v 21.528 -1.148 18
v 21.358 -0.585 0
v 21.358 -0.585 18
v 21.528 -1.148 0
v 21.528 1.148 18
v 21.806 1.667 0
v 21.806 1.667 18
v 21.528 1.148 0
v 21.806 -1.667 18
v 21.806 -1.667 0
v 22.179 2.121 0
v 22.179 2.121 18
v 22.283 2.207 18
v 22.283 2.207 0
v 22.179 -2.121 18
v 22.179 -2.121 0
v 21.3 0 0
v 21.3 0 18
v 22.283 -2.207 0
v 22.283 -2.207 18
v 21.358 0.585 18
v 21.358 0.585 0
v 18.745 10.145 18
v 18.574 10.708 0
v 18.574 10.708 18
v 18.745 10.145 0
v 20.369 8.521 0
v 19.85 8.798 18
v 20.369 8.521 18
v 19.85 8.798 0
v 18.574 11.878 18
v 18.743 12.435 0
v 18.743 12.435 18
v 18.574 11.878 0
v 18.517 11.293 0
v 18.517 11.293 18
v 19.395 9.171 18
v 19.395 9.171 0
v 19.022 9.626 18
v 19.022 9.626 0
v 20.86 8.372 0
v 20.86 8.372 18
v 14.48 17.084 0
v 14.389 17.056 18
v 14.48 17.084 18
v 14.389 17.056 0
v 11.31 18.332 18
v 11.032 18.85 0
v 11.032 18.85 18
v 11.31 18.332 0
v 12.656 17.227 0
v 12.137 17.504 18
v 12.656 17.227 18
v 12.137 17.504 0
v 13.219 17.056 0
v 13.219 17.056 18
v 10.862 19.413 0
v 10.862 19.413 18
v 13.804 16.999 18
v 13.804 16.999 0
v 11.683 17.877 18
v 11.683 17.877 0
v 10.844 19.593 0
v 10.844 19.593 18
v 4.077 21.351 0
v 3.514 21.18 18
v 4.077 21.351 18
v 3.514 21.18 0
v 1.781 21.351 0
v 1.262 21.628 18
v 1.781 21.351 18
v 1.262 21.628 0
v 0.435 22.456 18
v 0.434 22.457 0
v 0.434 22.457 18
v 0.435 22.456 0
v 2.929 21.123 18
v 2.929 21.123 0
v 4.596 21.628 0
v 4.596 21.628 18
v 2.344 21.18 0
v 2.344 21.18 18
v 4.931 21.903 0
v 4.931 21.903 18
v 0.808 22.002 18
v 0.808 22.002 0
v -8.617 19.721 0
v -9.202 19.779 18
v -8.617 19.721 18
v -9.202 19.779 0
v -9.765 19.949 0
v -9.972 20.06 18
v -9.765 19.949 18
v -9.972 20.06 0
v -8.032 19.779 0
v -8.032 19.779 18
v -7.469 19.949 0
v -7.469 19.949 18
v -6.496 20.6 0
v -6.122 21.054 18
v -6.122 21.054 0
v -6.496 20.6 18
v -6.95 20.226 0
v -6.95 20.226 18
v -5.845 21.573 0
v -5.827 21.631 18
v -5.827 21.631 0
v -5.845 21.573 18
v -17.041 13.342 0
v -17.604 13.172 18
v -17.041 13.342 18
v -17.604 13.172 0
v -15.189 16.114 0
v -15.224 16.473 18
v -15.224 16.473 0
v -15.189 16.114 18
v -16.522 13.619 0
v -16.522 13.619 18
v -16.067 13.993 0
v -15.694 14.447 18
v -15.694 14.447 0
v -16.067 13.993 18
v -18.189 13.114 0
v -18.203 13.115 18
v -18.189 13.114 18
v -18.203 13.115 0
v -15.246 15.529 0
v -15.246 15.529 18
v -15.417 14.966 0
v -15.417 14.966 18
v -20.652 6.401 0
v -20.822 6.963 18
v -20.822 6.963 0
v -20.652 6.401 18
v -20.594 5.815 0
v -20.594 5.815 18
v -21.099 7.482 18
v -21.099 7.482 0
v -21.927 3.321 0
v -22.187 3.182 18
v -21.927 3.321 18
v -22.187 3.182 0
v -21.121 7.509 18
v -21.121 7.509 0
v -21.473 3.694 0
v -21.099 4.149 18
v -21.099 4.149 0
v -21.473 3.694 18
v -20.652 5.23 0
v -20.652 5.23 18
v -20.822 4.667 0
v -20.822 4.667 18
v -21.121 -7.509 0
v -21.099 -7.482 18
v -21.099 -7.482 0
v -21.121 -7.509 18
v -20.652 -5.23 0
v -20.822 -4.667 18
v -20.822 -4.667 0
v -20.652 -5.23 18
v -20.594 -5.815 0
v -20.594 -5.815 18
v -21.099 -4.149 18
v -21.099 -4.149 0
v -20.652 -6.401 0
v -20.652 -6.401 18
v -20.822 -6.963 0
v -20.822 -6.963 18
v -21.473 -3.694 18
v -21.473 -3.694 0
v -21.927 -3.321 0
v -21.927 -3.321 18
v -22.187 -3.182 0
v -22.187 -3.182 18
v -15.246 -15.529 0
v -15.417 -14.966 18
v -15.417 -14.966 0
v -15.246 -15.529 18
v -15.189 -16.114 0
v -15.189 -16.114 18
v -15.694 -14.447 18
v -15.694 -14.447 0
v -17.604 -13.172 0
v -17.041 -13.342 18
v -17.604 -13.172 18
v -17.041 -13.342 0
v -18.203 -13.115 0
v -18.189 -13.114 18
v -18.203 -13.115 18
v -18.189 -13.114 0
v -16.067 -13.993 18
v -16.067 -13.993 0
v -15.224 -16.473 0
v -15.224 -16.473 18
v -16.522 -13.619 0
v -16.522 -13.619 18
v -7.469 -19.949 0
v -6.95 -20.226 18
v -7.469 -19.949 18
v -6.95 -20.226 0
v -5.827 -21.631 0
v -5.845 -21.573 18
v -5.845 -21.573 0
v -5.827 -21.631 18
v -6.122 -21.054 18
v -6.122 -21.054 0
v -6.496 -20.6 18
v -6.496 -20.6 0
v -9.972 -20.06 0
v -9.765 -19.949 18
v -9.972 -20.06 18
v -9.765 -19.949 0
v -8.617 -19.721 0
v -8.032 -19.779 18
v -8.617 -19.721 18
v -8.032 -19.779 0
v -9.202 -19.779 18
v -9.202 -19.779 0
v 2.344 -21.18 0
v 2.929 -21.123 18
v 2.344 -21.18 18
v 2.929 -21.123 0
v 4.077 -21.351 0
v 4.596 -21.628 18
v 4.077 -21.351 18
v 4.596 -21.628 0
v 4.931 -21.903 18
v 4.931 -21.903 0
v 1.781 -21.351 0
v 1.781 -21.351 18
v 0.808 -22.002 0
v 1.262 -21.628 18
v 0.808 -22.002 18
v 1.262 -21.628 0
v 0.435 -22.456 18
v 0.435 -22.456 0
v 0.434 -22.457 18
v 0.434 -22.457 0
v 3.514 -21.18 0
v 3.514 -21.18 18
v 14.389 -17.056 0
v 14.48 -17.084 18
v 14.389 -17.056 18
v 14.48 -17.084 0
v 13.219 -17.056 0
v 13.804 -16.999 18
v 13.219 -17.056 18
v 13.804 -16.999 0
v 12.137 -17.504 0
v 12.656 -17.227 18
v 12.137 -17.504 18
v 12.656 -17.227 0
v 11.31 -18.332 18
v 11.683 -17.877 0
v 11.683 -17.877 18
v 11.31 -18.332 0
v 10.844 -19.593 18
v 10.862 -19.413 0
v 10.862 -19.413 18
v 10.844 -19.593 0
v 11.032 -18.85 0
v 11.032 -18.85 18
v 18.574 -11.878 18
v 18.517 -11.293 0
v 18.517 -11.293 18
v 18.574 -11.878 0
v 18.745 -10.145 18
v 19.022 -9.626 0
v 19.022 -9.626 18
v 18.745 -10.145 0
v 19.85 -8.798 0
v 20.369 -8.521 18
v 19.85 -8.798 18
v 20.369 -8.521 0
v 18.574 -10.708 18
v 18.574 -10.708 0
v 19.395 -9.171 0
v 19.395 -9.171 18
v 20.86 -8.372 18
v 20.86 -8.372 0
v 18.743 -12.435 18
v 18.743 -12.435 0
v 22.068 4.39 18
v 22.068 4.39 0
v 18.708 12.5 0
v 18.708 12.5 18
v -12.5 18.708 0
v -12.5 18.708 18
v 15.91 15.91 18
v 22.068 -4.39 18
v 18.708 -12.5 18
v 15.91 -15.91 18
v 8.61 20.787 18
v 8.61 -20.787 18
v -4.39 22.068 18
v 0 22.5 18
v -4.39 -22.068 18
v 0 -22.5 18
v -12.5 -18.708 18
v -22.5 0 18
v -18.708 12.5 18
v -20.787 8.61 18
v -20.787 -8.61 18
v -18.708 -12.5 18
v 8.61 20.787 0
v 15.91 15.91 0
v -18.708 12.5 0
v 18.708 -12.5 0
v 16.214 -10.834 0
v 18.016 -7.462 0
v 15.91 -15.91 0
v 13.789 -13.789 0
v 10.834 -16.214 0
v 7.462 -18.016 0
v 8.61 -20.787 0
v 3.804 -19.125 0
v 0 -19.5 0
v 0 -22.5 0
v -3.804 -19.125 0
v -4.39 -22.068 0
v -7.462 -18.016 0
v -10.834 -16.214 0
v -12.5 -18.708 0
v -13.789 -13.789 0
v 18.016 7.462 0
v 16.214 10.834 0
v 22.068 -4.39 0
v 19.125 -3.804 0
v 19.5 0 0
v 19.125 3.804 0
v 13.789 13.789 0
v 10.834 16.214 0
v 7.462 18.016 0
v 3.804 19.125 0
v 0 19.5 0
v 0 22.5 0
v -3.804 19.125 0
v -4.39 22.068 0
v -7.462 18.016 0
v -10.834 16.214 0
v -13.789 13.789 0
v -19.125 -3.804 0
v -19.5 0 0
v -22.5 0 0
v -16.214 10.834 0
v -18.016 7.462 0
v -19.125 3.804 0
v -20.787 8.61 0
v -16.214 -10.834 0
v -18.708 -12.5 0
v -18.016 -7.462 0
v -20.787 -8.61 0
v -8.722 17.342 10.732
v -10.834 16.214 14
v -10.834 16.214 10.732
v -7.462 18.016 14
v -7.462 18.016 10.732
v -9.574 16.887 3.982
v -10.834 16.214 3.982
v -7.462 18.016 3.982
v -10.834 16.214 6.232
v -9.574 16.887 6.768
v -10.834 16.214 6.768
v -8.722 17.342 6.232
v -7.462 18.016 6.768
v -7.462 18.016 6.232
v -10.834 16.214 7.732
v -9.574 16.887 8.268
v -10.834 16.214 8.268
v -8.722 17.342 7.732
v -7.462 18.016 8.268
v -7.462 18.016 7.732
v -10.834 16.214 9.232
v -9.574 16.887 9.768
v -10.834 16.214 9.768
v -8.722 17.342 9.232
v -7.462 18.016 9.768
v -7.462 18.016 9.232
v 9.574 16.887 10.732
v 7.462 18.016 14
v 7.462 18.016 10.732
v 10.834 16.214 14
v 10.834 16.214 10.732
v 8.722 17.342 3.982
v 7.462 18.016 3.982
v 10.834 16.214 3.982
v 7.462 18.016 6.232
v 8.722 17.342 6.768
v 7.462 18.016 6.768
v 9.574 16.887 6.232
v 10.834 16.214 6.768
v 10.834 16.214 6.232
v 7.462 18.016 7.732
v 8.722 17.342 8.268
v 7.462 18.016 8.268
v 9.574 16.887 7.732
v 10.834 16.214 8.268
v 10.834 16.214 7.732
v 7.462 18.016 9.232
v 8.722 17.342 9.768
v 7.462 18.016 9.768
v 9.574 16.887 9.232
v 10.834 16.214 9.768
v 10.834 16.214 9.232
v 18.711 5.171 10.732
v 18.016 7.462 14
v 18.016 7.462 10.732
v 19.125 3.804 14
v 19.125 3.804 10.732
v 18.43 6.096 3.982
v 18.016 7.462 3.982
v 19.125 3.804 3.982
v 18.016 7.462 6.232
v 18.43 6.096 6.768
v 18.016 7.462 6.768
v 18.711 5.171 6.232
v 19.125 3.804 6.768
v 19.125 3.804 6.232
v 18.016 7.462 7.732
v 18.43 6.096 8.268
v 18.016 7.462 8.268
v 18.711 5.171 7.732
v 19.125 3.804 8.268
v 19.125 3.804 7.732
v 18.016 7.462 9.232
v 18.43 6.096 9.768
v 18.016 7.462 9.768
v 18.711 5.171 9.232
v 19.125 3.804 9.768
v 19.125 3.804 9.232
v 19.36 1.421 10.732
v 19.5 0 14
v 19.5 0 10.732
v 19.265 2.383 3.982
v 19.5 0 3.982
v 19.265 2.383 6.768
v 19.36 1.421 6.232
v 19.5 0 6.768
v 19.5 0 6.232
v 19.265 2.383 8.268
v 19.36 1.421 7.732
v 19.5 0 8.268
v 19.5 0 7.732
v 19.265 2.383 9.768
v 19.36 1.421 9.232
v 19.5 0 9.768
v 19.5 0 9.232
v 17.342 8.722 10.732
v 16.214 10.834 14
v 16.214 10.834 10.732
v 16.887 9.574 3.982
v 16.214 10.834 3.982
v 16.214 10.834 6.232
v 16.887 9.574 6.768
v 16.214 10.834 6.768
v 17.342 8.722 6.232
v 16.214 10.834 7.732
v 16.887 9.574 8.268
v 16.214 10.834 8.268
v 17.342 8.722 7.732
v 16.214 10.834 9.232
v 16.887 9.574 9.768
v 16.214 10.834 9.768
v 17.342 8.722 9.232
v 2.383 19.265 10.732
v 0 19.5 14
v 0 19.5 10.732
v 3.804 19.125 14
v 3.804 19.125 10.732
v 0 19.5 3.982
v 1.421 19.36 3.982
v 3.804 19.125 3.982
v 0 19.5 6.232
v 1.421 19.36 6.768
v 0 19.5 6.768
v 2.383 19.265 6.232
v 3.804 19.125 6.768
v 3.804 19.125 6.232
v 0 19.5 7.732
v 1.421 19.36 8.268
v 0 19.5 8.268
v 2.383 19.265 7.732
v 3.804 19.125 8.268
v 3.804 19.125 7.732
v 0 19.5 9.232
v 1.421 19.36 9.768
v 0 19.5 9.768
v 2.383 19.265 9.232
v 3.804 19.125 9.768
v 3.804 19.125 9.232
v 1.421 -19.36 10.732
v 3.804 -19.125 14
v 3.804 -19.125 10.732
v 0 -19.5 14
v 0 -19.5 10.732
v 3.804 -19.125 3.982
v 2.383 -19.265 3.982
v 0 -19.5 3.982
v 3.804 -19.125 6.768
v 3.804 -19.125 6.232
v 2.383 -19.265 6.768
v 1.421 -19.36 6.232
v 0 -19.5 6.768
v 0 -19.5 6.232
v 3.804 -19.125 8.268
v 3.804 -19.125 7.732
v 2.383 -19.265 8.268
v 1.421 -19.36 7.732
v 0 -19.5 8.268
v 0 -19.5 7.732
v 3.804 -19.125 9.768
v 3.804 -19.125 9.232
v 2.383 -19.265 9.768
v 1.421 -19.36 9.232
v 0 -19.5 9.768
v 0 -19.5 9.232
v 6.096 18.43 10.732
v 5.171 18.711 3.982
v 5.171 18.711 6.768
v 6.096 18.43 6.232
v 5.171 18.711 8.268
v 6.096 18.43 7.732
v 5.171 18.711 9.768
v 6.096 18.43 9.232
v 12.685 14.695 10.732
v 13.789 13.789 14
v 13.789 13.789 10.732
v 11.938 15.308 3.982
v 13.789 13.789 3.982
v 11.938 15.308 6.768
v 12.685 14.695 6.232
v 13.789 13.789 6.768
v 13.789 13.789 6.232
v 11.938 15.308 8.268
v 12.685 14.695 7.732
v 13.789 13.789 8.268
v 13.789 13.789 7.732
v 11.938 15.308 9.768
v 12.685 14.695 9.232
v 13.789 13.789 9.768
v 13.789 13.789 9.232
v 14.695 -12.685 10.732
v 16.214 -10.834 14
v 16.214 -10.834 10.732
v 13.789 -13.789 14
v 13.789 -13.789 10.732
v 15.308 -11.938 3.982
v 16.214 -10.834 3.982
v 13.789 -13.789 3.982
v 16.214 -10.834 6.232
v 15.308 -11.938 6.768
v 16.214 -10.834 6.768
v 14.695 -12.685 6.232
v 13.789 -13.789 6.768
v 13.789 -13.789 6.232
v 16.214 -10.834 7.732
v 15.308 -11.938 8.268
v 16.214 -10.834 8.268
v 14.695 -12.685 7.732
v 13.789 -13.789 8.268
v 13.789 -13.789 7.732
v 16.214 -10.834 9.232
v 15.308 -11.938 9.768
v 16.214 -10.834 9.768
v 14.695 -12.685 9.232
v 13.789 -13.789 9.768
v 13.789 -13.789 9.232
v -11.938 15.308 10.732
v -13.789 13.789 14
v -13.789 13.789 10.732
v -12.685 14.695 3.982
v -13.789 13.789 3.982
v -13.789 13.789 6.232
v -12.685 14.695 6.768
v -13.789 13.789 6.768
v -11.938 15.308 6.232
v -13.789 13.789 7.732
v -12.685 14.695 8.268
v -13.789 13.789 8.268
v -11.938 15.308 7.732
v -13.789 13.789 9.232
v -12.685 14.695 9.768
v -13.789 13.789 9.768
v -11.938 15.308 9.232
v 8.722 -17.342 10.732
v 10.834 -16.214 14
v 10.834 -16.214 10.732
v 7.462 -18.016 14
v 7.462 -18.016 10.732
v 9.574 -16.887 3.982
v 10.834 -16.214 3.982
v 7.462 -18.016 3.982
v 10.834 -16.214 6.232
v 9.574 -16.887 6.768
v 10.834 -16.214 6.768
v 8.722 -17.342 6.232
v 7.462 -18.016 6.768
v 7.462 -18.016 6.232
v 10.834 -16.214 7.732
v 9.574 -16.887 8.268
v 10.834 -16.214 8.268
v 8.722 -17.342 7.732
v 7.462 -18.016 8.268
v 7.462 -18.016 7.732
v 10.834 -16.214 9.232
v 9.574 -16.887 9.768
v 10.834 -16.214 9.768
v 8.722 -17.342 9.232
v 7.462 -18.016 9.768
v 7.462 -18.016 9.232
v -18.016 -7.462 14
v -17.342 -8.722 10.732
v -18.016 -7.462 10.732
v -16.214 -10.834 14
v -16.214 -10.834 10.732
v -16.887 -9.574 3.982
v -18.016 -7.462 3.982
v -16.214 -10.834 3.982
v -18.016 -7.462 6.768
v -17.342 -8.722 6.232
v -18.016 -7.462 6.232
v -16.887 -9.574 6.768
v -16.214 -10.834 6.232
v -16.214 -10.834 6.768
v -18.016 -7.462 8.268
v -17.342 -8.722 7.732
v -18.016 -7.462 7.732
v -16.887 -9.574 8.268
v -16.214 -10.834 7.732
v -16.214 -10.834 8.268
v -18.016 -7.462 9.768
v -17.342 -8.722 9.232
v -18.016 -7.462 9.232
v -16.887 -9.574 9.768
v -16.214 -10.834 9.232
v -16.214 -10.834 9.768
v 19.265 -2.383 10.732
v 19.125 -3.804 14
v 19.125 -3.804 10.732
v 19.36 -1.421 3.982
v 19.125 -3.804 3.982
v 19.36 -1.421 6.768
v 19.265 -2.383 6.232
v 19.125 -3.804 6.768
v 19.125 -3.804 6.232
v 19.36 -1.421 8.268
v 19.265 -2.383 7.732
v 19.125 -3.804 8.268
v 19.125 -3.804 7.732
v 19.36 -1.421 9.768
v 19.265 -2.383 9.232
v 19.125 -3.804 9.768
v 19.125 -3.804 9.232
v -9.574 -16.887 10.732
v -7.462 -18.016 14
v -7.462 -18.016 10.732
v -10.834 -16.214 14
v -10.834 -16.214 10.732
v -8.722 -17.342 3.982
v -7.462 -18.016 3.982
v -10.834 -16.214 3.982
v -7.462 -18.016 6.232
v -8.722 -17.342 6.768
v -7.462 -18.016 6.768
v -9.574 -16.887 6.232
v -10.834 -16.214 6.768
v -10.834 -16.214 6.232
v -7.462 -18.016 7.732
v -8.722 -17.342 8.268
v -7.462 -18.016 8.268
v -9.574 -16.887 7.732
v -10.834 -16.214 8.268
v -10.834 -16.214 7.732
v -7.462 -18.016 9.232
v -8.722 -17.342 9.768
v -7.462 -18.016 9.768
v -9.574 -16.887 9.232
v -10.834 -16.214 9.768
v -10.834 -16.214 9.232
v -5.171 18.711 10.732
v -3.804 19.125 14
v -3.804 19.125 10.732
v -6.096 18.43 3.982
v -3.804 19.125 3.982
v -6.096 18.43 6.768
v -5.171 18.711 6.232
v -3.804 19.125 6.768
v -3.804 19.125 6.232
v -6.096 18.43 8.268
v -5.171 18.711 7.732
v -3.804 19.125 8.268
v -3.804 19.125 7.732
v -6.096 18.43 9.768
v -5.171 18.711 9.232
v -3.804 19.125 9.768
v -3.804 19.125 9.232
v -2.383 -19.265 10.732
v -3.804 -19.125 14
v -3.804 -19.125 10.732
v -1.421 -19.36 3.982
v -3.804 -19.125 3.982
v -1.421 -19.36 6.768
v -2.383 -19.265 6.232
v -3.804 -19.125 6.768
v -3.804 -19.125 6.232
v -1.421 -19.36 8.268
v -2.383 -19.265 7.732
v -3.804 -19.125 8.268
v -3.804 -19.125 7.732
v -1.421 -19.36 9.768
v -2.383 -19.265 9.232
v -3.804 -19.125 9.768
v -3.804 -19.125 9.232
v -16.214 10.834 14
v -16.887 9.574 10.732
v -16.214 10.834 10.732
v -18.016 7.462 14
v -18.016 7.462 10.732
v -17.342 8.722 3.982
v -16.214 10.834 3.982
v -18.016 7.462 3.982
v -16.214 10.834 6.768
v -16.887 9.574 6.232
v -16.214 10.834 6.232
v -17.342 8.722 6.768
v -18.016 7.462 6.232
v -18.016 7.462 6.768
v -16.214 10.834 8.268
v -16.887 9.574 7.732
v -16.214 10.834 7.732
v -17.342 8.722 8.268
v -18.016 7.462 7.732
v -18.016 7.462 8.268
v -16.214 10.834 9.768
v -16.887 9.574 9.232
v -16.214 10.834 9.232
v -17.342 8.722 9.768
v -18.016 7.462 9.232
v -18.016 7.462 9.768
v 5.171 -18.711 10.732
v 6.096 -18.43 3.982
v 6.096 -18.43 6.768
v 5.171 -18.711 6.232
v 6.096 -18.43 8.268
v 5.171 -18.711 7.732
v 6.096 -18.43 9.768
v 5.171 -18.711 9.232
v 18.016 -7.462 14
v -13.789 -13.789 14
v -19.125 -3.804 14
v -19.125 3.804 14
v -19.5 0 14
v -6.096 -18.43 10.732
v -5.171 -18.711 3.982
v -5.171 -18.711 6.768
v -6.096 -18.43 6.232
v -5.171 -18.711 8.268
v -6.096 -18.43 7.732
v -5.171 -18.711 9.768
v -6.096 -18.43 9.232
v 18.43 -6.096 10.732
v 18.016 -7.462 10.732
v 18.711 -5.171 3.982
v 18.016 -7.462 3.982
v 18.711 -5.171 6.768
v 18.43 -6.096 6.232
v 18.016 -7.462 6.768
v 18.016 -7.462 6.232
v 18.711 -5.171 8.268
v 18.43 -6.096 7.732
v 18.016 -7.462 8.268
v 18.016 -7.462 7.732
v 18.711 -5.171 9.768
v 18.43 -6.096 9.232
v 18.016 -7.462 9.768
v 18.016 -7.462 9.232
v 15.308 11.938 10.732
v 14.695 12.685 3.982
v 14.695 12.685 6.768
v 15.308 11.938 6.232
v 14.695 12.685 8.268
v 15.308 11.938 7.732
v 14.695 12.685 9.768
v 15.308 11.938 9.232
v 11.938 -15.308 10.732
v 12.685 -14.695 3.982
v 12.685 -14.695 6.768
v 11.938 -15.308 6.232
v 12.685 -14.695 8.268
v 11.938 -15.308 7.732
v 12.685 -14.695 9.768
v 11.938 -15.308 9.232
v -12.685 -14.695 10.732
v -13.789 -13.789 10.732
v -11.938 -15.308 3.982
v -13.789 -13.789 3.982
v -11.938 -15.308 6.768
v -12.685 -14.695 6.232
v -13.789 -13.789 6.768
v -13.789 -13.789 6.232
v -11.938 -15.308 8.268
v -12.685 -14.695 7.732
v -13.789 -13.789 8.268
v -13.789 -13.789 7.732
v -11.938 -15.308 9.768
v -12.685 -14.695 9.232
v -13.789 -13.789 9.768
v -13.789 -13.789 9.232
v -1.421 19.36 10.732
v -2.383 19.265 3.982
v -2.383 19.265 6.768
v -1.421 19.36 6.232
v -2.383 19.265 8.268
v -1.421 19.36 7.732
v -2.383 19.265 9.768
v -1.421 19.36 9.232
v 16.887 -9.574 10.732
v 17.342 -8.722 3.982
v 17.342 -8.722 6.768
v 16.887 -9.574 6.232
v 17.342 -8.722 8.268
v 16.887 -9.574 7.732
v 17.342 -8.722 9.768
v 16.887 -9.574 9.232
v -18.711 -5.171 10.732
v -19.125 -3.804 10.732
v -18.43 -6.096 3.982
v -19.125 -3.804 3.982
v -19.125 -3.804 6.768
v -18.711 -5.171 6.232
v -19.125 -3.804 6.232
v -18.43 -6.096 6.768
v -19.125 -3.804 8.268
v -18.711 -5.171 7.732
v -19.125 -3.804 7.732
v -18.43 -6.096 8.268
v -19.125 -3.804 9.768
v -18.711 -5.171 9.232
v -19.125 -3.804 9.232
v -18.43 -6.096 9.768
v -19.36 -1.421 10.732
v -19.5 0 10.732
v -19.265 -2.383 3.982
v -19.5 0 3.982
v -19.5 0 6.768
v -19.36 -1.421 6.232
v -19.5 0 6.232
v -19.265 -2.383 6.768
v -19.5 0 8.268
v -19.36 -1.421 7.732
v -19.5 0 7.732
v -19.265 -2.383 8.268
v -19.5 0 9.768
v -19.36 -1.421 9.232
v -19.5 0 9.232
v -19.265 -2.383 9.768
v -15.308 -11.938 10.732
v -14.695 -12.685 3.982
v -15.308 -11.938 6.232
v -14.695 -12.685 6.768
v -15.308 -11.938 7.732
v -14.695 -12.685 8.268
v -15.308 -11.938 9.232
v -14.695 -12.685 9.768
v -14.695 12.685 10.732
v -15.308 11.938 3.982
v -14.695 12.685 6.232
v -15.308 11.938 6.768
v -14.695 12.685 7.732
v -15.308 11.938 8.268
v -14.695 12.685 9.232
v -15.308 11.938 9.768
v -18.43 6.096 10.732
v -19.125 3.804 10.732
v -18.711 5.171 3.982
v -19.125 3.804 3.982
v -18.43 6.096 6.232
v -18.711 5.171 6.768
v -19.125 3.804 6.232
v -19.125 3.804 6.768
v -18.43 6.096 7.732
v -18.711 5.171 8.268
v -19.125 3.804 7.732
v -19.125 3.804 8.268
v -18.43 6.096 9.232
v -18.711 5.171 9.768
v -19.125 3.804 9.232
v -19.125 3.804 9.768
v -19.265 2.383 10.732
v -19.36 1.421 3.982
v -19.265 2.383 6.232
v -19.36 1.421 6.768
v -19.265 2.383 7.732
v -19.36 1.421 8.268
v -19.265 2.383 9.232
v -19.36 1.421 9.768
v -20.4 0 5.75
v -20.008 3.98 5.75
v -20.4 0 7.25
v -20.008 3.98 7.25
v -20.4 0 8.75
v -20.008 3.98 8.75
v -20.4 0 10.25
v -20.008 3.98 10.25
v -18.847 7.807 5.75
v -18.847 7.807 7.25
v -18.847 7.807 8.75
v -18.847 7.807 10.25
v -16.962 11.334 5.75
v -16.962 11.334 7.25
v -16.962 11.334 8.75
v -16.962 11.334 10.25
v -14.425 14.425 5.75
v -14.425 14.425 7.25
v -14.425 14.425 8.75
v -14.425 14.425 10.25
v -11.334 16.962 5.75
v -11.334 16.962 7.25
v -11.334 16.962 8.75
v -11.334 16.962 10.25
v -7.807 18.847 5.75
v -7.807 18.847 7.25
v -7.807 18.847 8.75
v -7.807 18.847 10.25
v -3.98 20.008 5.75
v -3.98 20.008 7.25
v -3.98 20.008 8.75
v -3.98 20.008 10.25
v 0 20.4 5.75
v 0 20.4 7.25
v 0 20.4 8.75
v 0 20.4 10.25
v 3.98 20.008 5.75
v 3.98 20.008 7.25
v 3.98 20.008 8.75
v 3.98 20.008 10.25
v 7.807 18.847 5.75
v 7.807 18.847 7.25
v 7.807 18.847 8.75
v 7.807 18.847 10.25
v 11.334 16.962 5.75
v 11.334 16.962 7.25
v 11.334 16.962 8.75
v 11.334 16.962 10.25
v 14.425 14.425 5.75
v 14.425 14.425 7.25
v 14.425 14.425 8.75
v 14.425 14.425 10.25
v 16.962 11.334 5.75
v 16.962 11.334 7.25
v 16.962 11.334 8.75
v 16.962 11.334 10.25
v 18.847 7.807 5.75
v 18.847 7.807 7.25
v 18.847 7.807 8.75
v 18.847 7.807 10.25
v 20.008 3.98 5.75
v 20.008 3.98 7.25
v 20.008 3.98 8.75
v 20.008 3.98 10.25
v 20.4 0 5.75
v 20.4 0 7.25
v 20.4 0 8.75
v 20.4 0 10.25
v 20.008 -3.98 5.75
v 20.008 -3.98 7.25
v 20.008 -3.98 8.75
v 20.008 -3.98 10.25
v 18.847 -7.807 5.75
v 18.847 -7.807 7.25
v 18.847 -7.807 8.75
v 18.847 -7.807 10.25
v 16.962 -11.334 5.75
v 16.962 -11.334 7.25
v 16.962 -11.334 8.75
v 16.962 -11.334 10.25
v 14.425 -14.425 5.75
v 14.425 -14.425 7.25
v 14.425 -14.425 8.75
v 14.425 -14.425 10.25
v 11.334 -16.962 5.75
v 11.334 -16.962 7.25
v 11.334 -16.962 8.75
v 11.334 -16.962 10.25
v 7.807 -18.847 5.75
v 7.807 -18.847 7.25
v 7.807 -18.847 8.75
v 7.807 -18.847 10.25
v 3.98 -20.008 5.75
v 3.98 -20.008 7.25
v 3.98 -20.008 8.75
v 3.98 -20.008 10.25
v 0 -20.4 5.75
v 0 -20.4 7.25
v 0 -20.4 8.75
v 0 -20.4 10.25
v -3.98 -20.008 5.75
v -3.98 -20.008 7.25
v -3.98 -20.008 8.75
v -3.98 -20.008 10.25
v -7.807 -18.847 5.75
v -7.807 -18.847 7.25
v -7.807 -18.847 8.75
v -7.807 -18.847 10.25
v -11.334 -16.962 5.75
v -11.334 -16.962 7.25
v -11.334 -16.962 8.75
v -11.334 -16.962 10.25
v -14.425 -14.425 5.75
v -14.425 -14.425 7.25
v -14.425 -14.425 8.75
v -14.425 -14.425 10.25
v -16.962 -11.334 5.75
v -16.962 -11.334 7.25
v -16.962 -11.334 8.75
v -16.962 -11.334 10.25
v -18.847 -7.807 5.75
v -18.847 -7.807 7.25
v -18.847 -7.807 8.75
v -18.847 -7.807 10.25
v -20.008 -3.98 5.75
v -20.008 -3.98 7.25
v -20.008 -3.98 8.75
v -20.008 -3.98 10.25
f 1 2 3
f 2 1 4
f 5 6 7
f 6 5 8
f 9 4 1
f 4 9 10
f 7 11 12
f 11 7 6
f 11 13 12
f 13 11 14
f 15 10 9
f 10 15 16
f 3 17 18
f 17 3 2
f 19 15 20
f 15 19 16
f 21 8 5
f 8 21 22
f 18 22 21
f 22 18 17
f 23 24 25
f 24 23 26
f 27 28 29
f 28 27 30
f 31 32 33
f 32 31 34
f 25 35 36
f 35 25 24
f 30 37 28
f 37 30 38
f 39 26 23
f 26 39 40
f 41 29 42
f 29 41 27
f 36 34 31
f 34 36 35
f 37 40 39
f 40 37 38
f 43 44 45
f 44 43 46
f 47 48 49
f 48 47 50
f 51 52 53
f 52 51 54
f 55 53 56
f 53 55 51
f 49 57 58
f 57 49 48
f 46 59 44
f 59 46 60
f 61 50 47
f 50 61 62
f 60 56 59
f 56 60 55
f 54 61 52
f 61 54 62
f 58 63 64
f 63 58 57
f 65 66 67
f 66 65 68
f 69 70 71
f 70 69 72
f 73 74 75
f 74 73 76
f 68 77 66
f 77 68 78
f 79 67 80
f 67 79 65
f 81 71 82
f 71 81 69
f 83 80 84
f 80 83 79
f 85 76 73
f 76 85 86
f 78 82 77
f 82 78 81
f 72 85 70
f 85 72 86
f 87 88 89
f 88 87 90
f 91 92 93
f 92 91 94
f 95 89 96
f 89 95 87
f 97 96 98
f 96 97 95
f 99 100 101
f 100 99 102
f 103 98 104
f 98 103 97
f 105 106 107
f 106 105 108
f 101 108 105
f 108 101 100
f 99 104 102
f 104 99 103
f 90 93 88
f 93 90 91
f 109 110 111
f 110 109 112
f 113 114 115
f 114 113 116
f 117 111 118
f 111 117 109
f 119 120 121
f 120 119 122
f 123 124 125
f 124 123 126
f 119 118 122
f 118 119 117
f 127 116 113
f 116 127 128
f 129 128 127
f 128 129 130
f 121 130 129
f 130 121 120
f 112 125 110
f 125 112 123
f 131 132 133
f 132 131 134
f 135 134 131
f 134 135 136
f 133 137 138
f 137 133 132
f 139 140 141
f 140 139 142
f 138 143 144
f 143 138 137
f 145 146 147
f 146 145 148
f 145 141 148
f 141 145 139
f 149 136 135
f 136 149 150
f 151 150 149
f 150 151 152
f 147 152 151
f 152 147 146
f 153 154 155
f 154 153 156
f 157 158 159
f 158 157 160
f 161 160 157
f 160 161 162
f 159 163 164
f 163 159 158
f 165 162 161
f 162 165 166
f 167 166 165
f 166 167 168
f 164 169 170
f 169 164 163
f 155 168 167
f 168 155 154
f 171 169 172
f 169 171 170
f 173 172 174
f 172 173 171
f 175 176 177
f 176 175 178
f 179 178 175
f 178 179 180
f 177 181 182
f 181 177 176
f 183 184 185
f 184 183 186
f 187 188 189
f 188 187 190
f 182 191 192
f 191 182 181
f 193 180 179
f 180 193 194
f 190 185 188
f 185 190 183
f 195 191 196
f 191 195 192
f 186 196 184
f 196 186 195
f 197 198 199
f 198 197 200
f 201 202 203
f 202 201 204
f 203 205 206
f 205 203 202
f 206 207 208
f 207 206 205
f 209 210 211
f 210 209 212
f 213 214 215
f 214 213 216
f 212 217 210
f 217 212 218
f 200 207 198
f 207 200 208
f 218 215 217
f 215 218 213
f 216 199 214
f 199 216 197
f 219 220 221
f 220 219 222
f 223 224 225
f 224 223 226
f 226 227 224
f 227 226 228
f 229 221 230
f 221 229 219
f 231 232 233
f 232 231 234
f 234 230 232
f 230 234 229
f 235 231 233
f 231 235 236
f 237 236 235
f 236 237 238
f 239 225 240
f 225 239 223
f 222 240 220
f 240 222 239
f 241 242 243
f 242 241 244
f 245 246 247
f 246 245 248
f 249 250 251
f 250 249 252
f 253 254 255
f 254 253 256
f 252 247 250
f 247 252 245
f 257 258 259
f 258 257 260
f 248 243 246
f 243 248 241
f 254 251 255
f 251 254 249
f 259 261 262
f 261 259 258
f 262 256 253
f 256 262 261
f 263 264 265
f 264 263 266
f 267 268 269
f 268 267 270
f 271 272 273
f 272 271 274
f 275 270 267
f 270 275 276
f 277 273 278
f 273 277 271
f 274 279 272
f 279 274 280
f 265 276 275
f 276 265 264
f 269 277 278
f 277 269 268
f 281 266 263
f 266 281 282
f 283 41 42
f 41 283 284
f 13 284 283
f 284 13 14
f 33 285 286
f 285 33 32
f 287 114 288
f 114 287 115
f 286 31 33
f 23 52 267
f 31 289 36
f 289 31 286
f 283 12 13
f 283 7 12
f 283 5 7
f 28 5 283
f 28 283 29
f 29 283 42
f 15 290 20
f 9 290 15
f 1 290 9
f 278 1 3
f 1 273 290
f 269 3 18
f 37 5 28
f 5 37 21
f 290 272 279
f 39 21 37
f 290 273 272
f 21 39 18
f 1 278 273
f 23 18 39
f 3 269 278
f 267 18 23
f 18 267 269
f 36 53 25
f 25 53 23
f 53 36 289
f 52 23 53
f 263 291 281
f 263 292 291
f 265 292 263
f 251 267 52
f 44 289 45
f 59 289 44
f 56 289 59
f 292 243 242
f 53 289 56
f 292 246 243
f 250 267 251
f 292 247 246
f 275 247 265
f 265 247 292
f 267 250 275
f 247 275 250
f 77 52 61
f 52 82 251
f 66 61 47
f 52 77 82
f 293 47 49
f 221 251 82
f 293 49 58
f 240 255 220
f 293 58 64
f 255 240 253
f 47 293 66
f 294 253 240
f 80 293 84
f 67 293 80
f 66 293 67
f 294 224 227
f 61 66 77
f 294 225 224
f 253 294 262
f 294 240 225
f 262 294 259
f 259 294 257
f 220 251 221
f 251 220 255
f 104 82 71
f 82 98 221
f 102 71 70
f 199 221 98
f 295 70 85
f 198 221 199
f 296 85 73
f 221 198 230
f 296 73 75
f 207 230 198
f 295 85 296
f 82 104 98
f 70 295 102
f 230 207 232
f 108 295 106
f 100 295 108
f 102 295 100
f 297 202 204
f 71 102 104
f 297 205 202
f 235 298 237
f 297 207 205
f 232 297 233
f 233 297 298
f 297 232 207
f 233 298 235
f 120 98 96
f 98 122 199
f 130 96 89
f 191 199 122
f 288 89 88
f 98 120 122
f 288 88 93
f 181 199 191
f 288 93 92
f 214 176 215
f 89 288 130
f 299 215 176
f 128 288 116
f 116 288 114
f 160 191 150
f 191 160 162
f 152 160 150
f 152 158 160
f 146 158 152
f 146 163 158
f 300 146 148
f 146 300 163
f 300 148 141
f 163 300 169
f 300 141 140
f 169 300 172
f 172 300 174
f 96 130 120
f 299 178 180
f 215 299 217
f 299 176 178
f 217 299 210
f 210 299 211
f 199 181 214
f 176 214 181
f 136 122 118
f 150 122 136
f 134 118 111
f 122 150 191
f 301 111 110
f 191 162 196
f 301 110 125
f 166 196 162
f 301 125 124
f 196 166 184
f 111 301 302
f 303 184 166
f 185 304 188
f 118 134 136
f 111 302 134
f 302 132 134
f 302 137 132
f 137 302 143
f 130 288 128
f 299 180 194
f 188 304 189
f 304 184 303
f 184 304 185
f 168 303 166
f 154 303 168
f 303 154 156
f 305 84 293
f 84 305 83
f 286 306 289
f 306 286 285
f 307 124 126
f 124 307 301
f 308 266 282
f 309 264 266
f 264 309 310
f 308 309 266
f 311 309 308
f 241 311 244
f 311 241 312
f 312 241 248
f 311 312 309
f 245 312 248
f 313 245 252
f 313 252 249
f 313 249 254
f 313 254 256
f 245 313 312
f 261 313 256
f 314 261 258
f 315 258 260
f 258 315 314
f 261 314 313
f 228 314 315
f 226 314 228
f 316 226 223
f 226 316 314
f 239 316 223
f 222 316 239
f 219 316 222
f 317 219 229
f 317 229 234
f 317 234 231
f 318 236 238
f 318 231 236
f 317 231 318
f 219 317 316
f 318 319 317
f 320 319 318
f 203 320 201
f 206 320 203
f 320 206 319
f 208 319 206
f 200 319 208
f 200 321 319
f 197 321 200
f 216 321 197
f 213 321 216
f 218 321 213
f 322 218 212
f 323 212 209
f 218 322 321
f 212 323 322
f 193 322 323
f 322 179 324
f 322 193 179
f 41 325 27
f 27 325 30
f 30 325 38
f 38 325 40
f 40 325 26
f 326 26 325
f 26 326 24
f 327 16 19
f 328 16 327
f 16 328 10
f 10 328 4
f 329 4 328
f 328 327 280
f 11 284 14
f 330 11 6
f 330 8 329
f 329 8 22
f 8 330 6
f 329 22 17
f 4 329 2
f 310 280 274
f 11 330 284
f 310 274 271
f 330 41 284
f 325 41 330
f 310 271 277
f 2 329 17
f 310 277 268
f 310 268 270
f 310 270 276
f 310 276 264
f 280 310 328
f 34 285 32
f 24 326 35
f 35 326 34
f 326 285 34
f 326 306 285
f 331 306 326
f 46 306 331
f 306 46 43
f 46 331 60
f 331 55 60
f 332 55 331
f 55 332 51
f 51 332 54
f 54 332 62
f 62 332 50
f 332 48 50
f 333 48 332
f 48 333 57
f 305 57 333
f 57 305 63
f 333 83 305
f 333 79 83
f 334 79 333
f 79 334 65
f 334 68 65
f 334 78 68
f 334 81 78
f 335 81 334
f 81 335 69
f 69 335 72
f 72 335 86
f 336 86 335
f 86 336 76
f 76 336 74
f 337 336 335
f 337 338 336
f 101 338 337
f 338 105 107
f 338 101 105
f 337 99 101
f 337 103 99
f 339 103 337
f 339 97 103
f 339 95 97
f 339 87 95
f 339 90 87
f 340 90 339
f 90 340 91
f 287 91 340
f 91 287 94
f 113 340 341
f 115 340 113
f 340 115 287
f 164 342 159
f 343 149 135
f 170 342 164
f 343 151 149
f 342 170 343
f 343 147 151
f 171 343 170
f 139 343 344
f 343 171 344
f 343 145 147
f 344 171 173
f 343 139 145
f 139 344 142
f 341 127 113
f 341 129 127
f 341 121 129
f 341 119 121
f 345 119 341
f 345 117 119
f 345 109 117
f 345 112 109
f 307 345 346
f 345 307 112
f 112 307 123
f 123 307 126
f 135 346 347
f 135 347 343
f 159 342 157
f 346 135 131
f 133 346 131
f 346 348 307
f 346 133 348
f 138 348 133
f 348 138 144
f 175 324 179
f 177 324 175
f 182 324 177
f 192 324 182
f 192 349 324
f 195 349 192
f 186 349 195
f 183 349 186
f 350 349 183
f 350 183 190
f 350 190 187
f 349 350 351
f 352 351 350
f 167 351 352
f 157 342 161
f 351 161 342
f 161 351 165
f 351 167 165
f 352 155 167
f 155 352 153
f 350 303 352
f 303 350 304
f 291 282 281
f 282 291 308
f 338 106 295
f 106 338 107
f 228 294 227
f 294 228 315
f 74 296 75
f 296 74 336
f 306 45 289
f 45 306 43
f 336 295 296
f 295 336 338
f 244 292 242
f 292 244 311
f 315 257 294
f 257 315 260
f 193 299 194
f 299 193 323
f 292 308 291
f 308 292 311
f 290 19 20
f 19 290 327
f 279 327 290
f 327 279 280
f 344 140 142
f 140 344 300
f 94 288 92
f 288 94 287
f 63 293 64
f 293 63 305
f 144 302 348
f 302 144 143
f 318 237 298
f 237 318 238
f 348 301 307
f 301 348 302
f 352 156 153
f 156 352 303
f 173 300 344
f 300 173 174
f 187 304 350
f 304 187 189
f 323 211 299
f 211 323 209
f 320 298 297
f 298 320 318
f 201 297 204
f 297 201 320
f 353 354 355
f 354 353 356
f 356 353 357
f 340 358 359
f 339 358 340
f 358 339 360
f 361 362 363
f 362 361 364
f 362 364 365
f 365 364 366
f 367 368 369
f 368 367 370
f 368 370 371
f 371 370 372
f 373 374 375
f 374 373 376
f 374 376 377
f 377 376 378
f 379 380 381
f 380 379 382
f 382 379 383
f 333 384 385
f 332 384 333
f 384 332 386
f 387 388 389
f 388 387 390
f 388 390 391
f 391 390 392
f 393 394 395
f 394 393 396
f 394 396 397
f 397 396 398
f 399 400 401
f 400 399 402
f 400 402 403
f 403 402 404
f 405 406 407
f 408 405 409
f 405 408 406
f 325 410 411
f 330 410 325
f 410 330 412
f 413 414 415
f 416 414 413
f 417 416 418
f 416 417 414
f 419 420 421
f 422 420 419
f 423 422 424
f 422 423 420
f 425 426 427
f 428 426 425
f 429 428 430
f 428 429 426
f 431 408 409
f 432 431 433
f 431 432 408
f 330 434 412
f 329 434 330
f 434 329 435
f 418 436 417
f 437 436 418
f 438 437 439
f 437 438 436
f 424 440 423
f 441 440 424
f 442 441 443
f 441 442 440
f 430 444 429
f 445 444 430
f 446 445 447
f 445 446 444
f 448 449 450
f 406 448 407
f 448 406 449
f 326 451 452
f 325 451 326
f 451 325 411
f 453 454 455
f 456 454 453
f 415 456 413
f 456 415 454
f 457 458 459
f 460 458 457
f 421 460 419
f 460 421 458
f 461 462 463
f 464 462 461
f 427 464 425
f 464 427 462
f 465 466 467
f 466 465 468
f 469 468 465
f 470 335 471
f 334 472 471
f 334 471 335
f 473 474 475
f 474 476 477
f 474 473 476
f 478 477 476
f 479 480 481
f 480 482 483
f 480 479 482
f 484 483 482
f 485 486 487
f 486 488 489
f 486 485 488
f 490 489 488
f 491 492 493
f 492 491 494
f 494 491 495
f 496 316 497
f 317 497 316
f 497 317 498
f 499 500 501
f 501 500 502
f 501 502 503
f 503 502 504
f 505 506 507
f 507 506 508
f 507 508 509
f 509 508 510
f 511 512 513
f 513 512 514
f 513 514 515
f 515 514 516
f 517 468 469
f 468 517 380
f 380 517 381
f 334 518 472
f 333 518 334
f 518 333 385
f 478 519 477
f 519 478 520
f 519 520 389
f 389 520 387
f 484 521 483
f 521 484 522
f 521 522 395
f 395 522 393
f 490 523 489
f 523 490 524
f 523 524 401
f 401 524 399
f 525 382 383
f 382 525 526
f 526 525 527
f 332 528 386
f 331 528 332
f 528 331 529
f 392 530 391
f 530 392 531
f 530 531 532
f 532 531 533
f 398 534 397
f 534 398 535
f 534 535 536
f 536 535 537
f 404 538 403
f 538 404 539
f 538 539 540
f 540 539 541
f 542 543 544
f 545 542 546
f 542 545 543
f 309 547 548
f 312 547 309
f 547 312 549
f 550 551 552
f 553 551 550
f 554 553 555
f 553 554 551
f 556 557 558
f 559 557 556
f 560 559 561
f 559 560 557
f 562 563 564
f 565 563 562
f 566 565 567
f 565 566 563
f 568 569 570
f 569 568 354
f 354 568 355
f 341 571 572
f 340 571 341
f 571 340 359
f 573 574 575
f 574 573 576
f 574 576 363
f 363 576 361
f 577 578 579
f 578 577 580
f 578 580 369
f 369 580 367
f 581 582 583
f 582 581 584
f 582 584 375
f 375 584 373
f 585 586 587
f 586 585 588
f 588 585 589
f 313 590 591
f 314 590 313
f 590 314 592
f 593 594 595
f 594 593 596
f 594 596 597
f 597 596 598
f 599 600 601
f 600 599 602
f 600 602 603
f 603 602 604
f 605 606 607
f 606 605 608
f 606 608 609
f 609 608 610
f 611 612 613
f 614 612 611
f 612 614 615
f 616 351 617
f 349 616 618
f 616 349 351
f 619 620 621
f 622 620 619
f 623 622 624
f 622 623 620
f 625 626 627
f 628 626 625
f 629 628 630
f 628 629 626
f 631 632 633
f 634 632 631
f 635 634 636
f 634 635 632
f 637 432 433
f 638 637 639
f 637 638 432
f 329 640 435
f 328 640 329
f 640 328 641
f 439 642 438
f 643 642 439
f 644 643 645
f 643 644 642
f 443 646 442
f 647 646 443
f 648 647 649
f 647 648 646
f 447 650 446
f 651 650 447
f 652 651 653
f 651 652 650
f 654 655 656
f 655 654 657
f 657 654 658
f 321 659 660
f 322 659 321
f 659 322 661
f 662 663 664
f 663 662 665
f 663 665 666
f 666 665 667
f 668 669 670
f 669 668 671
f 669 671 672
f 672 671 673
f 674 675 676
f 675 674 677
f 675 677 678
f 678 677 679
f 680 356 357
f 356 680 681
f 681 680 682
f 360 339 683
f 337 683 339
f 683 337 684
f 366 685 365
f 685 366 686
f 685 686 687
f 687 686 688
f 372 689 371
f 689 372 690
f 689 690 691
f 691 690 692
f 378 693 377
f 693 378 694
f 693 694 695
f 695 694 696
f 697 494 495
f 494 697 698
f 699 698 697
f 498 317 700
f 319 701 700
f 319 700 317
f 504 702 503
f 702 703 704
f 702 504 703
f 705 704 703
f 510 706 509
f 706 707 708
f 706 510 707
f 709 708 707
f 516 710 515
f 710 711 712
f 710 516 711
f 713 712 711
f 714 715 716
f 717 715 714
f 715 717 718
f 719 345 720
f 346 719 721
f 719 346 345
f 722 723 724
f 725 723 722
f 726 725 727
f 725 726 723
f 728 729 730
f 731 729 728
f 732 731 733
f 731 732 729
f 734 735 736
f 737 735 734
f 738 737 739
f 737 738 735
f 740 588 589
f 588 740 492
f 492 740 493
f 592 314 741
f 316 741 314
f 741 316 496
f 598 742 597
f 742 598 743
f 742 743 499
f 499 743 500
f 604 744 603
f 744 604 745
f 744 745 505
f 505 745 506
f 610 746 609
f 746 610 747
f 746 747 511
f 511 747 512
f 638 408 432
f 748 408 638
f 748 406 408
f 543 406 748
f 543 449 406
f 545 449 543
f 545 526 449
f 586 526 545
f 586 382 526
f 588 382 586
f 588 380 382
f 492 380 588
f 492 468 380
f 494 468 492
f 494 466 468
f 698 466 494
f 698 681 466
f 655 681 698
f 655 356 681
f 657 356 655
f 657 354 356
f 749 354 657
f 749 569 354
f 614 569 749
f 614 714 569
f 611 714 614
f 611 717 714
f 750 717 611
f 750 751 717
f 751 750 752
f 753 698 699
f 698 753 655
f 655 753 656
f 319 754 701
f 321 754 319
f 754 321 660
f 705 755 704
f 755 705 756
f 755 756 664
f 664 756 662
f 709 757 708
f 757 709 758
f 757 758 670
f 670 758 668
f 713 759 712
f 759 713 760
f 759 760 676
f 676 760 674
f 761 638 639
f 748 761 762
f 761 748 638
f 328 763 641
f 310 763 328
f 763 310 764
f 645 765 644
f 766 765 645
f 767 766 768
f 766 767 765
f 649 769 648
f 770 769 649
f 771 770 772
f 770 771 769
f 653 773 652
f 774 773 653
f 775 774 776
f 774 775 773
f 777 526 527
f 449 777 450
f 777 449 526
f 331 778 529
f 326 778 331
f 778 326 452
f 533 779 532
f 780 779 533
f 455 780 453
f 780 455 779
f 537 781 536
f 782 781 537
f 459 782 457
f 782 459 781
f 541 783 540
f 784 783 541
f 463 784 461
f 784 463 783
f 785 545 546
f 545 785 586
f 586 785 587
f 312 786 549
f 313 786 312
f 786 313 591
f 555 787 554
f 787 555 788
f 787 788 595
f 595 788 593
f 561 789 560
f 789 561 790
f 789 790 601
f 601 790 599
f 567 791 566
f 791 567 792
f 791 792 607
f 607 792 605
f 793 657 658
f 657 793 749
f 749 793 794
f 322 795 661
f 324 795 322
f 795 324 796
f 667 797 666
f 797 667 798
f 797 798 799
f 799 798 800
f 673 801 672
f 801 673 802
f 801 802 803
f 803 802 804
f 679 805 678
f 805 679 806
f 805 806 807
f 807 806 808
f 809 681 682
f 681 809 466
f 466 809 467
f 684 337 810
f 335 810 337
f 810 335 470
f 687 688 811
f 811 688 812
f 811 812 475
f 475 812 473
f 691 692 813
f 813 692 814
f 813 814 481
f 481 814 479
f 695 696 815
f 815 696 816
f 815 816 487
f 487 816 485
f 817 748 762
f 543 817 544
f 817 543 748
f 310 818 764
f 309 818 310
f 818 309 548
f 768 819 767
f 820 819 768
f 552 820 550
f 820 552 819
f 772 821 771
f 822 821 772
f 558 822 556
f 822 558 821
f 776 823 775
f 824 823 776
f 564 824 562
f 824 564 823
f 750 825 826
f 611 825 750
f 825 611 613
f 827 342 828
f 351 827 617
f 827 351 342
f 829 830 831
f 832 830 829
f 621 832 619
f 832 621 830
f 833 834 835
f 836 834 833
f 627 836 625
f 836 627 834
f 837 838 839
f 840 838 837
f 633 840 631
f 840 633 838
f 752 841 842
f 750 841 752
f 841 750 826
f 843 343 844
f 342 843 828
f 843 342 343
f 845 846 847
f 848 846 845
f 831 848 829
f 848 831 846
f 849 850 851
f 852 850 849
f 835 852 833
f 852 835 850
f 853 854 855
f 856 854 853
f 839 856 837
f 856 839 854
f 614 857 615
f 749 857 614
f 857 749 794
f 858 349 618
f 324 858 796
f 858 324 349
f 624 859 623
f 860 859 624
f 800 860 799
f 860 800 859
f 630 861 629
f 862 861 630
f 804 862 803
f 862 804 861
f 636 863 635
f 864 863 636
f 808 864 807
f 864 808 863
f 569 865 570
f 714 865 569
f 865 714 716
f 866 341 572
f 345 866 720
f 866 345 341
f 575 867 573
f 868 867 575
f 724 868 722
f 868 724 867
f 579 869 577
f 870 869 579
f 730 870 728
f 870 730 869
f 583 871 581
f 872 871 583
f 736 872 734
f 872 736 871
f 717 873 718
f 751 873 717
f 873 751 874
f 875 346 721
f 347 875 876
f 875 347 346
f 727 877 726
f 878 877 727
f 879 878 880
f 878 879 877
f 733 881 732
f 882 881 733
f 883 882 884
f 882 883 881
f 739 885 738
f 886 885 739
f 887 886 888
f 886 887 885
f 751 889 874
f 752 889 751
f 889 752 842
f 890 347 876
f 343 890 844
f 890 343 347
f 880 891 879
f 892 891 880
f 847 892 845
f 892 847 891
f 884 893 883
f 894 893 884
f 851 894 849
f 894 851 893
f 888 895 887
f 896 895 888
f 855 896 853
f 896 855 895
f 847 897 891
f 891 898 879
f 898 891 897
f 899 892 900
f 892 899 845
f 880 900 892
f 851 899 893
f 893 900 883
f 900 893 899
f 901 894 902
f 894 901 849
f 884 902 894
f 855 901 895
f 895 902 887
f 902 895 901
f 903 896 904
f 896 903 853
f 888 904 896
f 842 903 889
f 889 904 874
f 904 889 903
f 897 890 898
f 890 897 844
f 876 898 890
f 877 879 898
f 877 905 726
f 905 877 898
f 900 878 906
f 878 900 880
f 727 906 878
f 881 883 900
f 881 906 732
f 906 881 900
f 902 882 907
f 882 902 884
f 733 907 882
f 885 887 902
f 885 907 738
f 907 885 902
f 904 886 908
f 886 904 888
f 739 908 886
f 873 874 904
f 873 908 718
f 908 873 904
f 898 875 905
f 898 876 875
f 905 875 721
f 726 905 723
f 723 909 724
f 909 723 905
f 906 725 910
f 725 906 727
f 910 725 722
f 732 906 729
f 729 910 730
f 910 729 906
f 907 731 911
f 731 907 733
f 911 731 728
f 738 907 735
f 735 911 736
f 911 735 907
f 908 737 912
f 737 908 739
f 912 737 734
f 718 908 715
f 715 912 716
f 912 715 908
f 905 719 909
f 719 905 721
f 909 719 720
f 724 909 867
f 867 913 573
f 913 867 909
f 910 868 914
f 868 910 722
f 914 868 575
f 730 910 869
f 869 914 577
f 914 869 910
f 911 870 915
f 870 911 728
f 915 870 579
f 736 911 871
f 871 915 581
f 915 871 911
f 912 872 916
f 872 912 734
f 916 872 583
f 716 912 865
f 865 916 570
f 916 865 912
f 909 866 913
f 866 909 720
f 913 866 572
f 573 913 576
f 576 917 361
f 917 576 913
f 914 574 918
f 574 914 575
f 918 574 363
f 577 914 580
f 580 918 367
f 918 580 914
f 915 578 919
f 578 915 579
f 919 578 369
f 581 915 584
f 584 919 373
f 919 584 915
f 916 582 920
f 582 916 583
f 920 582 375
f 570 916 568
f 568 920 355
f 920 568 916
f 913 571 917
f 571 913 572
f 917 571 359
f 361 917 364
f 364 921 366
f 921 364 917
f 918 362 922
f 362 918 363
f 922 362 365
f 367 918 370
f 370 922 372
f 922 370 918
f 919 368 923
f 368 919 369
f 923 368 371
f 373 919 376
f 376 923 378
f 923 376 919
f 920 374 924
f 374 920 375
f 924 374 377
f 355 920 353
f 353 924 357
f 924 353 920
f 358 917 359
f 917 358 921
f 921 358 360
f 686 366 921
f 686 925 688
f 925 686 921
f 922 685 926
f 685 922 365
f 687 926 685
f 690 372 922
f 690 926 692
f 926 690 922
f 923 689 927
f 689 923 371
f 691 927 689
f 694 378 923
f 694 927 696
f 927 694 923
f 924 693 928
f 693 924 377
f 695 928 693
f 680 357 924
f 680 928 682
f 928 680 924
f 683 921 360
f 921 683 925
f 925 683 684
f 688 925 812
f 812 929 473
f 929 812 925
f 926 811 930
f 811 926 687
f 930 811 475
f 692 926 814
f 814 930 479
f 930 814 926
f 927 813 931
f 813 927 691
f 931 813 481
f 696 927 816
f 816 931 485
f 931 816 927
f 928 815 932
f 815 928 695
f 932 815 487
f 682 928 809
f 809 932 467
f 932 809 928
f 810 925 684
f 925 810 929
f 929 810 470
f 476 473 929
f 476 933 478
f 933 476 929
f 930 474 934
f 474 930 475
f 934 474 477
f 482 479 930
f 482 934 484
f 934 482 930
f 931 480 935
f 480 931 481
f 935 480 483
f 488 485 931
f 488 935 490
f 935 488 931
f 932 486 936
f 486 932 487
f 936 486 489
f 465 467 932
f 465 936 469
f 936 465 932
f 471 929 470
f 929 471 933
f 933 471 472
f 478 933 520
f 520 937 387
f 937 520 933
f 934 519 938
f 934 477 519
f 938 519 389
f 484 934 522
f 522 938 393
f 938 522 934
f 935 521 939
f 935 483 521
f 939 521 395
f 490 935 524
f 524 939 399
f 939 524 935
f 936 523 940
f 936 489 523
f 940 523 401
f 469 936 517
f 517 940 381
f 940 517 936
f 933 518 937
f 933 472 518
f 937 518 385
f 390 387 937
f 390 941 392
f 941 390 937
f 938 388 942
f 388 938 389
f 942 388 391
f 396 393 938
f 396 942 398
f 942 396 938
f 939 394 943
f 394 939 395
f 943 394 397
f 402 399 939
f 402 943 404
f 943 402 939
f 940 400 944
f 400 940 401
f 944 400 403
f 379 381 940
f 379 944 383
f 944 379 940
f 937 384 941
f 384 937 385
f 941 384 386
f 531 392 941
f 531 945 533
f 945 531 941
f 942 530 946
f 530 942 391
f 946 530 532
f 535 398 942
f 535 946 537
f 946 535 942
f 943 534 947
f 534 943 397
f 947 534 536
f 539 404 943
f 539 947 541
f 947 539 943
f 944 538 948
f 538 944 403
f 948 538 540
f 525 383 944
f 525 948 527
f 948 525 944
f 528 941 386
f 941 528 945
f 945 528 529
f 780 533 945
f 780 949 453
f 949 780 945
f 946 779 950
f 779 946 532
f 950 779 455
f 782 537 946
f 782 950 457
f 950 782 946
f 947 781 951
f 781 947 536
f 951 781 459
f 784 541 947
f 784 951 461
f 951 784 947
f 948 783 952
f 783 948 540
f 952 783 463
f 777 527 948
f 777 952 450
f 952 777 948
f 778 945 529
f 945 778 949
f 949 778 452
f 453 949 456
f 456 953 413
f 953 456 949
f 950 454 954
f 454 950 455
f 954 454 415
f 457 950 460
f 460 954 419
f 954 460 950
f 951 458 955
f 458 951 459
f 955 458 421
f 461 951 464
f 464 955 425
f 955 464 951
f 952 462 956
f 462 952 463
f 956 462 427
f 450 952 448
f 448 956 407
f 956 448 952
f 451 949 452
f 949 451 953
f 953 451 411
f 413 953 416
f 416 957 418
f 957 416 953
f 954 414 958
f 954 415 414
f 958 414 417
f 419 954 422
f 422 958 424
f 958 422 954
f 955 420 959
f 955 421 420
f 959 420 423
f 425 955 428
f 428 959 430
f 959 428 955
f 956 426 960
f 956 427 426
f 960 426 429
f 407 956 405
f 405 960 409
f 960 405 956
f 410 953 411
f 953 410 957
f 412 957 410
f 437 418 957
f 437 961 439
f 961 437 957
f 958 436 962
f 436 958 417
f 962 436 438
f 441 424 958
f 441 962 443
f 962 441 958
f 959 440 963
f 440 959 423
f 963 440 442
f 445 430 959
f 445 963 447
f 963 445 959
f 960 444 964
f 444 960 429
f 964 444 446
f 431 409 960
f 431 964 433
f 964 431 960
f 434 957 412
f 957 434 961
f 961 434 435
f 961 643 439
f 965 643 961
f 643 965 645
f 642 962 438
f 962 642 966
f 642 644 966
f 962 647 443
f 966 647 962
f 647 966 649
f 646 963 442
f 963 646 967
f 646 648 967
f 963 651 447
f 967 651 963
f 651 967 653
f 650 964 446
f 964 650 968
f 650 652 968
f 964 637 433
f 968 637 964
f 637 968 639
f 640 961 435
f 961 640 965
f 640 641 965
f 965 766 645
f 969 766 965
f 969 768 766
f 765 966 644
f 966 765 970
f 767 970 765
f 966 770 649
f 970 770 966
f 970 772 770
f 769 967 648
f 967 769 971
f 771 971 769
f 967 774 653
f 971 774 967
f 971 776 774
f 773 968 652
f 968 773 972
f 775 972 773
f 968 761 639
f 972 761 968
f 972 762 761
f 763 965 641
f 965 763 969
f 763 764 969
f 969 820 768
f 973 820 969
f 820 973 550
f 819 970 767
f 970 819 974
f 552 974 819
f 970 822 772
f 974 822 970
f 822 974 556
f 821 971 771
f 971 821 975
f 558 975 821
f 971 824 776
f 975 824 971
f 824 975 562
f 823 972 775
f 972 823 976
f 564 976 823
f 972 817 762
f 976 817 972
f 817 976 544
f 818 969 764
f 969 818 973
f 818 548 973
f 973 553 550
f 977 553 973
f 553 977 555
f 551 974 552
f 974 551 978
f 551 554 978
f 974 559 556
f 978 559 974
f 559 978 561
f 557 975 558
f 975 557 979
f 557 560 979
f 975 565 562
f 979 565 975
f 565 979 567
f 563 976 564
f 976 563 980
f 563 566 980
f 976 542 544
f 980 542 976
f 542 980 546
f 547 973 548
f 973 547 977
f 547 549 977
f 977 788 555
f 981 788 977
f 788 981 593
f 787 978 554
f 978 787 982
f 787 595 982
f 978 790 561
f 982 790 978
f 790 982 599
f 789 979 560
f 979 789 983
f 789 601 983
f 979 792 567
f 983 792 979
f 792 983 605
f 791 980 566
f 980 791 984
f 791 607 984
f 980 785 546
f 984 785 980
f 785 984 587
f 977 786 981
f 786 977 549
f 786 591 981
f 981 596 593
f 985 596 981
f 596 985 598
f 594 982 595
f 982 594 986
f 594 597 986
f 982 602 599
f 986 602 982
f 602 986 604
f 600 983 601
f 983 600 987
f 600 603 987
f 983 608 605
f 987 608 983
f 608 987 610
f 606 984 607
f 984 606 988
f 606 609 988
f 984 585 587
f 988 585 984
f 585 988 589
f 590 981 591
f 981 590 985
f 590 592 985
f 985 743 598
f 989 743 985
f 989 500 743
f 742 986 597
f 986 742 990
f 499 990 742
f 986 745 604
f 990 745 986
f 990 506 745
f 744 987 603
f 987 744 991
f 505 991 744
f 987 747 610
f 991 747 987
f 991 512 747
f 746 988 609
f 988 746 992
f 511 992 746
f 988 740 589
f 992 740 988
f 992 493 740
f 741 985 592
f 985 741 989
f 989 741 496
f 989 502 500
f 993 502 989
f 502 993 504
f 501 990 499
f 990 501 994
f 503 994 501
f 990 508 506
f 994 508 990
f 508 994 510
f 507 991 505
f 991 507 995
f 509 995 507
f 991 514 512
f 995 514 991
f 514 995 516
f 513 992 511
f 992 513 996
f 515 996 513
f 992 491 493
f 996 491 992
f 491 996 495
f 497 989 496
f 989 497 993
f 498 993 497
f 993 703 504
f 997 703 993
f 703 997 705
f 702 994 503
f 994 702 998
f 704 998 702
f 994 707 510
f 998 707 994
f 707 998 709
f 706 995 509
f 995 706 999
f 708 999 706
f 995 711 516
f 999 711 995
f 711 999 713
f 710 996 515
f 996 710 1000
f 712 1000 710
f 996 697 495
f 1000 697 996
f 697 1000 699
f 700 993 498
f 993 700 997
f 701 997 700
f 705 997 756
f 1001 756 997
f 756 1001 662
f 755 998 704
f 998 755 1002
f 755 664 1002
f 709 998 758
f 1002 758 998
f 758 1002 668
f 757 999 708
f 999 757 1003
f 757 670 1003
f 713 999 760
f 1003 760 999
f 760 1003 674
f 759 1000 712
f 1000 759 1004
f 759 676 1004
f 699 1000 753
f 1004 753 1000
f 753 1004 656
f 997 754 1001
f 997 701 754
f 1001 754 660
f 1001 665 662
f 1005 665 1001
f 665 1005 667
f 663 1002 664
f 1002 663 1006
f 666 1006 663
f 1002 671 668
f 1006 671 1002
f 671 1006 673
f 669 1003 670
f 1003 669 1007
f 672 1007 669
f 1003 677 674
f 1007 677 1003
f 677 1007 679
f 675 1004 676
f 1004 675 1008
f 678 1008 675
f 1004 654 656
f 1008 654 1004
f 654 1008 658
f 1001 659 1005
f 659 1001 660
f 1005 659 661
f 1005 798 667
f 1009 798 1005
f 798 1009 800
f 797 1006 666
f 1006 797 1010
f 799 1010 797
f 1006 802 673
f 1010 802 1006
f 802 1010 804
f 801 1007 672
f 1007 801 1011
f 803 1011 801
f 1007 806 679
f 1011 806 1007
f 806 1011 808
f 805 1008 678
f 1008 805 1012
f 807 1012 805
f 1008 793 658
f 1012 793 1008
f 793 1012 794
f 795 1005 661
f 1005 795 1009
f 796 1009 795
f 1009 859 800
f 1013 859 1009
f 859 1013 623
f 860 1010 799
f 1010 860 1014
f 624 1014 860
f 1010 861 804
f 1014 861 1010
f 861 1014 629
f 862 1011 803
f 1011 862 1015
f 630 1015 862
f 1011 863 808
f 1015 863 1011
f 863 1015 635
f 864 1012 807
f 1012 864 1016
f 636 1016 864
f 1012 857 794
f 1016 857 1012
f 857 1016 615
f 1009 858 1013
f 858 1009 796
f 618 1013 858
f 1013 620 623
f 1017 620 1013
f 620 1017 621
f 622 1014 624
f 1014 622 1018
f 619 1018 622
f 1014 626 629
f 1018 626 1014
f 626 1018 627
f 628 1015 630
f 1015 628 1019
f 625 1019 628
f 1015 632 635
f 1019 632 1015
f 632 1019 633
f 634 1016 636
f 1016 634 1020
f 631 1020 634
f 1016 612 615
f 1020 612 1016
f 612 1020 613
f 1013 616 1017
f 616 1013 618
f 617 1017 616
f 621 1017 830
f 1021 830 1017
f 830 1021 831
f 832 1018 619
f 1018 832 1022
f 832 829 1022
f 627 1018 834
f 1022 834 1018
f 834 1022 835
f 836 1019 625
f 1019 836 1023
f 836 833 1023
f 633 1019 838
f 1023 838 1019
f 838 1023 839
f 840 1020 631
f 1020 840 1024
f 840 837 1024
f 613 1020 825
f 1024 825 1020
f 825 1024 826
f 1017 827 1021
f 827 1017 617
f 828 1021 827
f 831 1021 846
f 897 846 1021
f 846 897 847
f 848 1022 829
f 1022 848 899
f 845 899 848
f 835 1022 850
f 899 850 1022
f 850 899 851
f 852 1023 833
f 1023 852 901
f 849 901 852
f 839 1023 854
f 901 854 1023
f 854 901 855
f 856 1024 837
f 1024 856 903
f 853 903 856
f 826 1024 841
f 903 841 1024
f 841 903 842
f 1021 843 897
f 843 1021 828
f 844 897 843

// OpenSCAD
$fn = 32;

// ----------------------------------------------------------------------
// Threaded cap: 45 mm body, 18 mm tall, 39 mm threaded bore
// ----------------------------------------------------------------------

// --- parameters (mm) ---
outer_d = 45;             // cap outside diameter
body_h = 18;              // cap height
top_t = 4;                // closed top thickness
bore_d = 39;              // bore core diameter
pitch = 1.5;              // thread pitch
thread_d = 0.9;           // thread depth
thread_z = 3;             // thread start above the rim
thread_h = 8;             // threaded height
flutes = 13;              // number of knurl flutes
flute_d = 6;              // flute cutter diameter
flute_depth = 1.2;        // flute depth into the rim

difference() {
  union() {
    cylinder(h = 18, d = outer_d);
  }
  /* threaded bore, closed at the top */
  translate([0, 0, -2.5]) cylinder(h = 16.5, d = bore_d);
  translate([0, 0, 3]) rotate_extrude() polygon([[18.5, 0], [18.5, 8], [19, 8], [20.4, 7.25], [19, 6.5], [20.4, 5.75], [19, 5], [20.4, 4.25], [19, 3.5], [20.4, 2.75], [19, 0], [18.5, 0]]);
  /* knurl flutes around the rim */
  for (i = [0 : flutes - 1]) {
    a = i * 360 / flutes;
    translate([(outer_d / 2 + flute_d / 2 - flute_depth) * cos(a), (outer_d / 2 + flute_d / 2 - flute_depth) * sin(a), -2.5]) cylinder(h = body_h + 5, d = flute_d);
  }
}
